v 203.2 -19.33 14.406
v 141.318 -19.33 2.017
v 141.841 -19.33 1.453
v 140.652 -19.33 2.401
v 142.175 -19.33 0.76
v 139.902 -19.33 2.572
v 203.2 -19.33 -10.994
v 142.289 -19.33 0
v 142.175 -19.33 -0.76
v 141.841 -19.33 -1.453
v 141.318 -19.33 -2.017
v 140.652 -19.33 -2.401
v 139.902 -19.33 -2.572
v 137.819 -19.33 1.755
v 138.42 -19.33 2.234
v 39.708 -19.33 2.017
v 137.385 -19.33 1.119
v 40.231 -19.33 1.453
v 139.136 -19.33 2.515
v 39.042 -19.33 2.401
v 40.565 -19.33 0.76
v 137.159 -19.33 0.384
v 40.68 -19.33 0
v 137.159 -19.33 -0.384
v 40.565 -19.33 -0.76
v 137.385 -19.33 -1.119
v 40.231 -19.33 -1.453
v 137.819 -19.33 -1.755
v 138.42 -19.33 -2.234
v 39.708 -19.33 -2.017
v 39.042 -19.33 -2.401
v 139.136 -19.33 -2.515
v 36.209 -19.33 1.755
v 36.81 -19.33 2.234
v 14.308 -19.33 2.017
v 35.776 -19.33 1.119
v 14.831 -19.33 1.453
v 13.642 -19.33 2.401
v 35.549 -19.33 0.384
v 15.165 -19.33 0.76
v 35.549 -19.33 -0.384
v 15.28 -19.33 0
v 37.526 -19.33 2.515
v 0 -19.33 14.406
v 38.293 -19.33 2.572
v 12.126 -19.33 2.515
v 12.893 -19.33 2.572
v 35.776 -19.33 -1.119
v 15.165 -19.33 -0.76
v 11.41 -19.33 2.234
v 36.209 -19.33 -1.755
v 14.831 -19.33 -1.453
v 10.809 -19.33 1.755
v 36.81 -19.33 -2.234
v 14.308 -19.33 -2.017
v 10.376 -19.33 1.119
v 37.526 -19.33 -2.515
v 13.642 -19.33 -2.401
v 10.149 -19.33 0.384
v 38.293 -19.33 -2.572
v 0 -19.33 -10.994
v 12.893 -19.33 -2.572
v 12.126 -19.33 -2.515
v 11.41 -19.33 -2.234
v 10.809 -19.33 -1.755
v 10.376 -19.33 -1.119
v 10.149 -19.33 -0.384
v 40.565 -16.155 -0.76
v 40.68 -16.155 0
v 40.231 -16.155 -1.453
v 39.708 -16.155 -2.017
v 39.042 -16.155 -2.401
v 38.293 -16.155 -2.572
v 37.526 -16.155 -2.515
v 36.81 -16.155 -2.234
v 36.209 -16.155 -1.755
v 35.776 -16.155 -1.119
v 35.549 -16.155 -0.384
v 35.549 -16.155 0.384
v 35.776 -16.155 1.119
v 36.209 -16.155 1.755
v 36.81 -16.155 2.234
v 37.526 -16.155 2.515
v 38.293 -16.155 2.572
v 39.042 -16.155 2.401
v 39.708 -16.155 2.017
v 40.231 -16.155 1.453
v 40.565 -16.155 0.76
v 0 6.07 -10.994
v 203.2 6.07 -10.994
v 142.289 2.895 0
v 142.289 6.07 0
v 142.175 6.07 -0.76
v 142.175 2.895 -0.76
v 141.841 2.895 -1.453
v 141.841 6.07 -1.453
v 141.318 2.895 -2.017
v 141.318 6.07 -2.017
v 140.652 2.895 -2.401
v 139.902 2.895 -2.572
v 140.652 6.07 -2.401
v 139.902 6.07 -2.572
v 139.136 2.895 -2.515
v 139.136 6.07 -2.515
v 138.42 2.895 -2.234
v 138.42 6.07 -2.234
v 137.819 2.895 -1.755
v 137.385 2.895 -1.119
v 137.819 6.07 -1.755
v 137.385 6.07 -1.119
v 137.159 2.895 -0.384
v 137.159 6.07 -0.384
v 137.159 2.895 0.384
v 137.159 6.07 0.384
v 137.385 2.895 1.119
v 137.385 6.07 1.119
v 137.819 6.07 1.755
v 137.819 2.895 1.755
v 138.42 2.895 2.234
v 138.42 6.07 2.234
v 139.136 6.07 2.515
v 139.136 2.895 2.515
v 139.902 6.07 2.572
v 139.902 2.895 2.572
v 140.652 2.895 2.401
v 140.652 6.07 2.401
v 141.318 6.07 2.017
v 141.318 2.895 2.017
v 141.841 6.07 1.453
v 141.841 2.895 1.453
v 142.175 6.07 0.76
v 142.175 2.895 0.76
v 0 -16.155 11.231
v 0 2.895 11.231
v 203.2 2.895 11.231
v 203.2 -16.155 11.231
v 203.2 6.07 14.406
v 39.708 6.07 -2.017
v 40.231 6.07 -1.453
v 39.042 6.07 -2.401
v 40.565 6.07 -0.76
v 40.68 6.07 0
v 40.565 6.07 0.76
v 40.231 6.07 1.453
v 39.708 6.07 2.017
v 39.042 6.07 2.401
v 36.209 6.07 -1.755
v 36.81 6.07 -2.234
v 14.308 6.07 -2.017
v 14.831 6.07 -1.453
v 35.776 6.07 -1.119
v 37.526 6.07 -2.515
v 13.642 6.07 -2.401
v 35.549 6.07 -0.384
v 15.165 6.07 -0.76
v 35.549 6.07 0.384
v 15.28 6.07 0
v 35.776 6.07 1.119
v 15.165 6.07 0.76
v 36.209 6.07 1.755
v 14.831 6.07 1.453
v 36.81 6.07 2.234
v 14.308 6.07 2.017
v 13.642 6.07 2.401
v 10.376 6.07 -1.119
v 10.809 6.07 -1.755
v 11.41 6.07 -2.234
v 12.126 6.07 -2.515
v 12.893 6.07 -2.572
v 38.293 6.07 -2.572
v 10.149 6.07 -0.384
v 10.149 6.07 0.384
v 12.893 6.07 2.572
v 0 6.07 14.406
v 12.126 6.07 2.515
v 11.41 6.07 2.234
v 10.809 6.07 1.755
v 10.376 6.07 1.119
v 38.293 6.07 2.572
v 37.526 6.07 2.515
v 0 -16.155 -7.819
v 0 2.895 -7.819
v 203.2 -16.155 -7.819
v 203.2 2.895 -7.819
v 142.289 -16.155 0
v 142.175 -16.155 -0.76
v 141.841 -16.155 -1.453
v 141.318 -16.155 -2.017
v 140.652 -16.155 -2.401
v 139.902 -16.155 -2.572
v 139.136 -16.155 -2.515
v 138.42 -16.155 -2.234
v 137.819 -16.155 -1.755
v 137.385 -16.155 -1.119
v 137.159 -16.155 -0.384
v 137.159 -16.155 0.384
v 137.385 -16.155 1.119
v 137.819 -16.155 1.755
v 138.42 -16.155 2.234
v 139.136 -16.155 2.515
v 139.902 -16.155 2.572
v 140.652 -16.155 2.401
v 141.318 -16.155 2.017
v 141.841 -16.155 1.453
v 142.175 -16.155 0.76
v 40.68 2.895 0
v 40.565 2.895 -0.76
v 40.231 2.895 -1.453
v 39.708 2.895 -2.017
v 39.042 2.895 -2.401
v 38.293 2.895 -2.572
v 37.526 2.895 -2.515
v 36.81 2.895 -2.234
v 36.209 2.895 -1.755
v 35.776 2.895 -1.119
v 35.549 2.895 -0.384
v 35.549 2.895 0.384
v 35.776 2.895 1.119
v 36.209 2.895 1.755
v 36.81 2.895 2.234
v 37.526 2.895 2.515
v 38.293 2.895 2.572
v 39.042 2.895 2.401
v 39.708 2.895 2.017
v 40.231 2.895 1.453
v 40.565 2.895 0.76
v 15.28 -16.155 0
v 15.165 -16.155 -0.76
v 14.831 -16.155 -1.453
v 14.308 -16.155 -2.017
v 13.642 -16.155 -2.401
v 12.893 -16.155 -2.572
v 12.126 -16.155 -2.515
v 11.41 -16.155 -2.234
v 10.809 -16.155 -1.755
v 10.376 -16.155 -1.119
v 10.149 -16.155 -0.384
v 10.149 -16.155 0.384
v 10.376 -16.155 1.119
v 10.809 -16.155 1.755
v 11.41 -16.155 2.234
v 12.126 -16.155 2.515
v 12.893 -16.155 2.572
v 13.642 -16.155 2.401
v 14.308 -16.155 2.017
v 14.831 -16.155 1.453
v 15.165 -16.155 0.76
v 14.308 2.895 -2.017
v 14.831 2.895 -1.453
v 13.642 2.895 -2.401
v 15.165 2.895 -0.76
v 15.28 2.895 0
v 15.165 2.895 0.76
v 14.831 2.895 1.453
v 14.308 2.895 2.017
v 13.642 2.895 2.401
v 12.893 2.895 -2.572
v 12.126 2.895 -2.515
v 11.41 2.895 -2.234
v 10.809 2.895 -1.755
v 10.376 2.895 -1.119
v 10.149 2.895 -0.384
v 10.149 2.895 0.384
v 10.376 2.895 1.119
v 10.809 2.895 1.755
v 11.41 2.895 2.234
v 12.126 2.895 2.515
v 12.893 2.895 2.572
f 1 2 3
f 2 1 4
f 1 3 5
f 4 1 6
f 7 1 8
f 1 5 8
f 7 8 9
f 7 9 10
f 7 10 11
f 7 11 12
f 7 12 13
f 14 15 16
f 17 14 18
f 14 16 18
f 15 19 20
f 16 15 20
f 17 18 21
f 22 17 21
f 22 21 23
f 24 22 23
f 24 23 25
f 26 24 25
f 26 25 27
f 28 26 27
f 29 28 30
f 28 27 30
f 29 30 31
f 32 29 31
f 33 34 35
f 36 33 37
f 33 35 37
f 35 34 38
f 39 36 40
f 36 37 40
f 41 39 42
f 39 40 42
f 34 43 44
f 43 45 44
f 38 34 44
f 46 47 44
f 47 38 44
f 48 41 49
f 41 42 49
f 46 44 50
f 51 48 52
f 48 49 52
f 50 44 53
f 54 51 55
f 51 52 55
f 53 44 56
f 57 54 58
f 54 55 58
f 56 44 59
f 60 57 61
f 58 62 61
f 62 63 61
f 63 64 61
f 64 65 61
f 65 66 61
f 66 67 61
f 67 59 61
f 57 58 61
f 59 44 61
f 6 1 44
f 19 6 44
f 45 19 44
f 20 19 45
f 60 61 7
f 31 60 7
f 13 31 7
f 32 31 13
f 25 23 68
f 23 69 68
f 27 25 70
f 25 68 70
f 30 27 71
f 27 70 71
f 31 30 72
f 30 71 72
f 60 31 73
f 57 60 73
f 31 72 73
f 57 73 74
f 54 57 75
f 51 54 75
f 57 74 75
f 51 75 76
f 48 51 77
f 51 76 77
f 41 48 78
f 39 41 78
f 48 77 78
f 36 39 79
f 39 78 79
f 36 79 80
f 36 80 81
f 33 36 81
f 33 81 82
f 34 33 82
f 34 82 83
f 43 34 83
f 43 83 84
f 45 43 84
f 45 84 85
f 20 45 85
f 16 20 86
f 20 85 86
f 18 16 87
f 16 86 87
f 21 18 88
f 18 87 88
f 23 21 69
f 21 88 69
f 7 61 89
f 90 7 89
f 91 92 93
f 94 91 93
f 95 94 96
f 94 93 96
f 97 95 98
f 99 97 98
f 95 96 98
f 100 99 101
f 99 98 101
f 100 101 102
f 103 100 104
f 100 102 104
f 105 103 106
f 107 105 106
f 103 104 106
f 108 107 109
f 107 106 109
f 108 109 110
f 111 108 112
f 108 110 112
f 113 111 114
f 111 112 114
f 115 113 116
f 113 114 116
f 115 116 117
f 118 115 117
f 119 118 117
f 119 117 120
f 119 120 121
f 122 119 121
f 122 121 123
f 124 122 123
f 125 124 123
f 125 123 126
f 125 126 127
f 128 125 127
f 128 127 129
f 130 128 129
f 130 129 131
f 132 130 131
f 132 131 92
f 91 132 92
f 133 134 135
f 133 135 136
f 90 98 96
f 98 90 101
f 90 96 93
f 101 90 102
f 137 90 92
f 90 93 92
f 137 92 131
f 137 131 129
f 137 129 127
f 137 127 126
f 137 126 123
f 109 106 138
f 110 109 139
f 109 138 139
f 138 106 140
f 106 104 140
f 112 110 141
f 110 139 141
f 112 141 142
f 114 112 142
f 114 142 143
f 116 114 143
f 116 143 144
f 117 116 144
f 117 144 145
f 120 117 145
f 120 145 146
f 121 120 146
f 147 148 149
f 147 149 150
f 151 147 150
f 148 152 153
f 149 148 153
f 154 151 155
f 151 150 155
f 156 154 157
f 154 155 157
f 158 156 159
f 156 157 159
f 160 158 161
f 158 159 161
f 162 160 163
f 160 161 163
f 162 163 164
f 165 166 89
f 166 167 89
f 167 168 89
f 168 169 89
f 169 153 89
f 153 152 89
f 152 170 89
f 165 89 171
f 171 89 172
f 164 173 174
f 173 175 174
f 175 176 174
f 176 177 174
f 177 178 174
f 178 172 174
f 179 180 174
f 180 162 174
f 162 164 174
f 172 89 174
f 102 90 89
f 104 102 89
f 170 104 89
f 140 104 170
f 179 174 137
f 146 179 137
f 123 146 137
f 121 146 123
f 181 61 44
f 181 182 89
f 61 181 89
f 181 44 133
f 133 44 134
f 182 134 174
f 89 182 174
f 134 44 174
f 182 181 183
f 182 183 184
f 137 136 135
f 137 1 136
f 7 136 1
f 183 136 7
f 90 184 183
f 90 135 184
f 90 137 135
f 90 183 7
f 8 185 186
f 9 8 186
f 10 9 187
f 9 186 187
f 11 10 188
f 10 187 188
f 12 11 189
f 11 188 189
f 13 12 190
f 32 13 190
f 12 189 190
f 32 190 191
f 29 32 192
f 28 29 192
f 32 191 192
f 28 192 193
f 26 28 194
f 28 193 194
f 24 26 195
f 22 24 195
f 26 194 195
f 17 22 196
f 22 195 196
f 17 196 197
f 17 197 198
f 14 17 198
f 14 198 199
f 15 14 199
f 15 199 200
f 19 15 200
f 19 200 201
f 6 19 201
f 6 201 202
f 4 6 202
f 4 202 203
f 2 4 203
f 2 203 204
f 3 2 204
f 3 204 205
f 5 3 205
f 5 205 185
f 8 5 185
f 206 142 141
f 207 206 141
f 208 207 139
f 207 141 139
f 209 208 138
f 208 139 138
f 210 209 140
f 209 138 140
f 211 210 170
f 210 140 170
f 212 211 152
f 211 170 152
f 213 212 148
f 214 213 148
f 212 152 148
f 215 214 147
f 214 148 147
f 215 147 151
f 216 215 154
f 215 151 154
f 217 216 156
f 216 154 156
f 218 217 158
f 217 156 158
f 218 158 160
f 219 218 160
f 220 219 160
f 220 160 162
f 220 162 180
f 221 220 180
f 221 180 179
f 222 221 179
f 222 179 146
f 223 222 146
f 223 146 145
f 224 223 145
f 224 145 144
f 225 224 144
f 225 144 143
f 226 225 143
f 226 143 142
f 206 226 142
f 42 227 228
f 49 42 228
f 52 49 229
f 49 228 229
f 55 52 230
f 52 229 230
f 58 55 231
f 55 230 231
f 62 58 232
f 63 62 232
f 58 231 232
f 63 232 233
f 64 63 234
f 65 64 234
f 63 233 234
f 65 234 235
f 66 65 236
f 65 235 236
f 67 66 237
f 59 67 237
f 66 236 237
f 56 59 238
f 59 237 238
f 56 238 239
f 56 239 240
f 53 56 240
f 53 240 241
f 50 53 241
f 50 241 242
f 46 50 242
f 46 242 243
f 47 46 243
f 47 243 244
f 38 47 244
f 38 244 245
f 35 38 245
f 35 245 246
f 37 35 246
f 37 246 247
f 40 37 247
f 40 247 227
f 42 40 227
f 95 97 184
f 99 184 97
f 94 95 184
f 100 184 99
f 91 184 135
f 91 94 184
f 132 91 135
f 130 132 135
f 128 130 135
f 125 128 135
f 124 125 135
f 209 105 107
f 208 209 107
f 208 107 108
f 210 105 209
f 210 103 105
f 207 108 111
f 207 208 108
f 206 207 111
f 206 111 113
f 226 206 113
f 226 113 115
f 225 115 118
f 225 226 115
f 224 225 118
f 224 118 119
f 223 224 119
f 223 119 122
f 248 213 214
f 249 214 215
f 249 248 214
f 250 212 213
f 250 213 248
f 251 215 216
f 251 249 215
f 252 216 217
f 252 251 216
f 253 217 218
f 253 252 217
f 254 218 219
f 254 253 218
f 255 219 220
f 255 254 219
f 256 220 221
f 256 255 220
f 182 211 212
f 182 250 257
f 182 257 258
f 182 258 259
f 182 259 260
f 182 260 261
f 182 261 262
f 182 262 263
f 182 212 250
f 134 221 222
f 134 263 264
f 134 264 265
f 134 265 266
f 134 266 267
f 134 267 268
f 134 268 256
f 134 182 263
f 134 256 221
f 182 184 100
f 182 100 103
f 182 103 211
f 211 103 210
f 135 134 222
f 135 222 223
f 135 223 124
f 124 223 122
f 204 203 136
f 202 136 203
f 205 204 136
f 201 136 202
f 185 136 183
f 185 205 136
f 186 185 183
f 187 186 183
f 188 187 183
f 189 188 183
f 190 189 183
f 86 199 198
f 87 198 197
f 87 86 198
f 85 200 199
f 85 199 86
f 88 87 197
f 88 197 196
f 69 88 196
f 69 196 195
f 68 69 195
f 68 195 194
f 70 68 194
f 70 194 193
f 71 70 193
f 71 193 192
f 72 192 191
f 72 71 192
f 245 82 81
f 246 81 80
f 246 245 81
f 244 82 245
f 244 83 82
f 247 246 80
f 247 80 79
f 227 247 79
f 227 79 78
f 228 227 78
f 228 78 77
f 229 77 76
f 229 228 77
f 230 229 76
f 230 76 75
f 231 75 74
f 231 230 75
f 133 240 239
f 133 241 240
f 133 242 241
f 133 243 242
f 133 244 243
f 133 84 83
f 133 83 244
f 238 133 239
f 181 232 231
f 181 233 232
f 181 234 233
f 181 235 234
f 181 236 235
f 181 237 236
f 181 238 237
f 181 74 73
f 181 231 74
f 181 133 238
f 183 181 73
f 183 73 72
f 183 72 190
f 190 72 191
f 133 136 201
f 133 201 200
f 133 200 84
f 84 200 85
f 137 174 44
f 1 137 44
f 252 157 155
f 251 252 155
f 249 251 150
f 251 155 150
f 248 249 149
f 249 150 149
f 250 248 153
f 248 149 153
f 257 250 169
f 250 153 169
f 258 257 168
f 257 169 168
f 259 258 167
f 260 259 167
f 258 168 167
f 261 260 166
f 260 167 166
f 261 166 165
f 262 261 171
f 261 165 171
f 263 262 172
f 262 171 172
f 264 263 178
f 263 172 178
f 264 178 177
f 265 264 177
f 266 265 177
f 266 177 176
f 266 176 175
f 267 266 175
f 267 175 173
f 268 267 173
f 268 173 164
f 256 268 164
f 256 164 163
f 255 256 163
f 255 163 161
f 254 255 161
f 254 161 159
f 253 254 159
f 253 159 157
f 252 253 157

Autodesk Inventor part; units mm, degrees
ref_plane "YZ Plane" through (0, 0, 0) normal (1, 0, 0) x (0, 1, 0)
ref_plane "XZ Plane" through (0, 0, 0) normal (0, 1, 0) x (-1, 0, 0)
ref_plane "XY Plane" through (0, 0, 0) normal (0, 0, 1) x (1, 0, 0)
sketch "Sketch1" plane through (0, 0, 0) normal (1, 0, 0) x (0, 1, 0)
  line L0 (6.0697, 14.4062) -> (-19.3303, 14.4062)
  line L1 (-19.3303, 14.4062) -> (-19.3303, -10.9938)
  line L2 (-19.3303, -10.9938) -> (6.0697, -10.9938)
  line L3 (6.0697, -10.9938) -> (6.0697, 14.4062)
  line L4 (2.8947, 11.2312) -> (-16.1553, 11.2312)
  line L5 (-16.1553, 11.2312) -> (-16.1553, -7.8188)
  line L6 (-16.1553, -7.8188) -> (2.8947, -7.8188)
  line L7 (2.8947, -7.8188) -> (2.8947, 11.2312)
  point P0 (0, 0)
  dimension "d0" = 25.4
  dimension "d1" = 25.4
  dimension "d2" = 3.175
extrude "Extrusion1" add sketch "Sketch1" along normal blind 304.8
sketch "Sketch2" plane through (0, 6.0697, 14.4062) normal (0, 1, 0) x (1, 0, 0)
  line L0 (0, 14.4062) -> (12.7, 14.4062)
  line L1 (12.7, 14.4062) -> (38.1, 14.4062)
  circle A0 centre (12.7, 14.4062) radius 2.5797
  circle A1 centre (38.1, 14.4062) radius 2.5797
  line L2 (304.8, 22.225) -> (304.8, 3.175) projected
  circle A2 centre (139.7096, 14.4062) radius 2.5797
  dimension "d5" = 12.7
  dimension "d6" = 25.4
  dimension "d7" = 5.1594
  dimension "d8" = 5.1594
  dimension "d13" = 5.1594
extrude "Extrusion3" cut sketch "Sketch2" against normal blind 304.8
sketch "Sketch3" plane through (0, 6.0697, 14.4062) normal (0, 1, 0) x (1, 0, 0)
  line L0 (304.8, 3.175) -> (304.8, 22.225) projected
  line L1 (304.8, 12.7) -> (203.2, 12.7)
  line L2 (0, 25.4) -> (304.8, 25.4) projected
  line L3 (0, 0) -> (304.8, 0) projected
  line L4 (203.2, 25.4) -> (304.8, 25.4)
  line L5 (304.8, 25.4) -> (304.8, 0)
  line L6 (304.8, 0) -> (203.2, 0)
  line L7 (203.2, 0) -> (203.2, 25.4)
  point P0 (0, 14.4062)
  dimension "d18" = 101.6
extrude "Extrusion4" cut sketch "Sketch3" against normal blind 304.8
properties part number "Tube Beam"
